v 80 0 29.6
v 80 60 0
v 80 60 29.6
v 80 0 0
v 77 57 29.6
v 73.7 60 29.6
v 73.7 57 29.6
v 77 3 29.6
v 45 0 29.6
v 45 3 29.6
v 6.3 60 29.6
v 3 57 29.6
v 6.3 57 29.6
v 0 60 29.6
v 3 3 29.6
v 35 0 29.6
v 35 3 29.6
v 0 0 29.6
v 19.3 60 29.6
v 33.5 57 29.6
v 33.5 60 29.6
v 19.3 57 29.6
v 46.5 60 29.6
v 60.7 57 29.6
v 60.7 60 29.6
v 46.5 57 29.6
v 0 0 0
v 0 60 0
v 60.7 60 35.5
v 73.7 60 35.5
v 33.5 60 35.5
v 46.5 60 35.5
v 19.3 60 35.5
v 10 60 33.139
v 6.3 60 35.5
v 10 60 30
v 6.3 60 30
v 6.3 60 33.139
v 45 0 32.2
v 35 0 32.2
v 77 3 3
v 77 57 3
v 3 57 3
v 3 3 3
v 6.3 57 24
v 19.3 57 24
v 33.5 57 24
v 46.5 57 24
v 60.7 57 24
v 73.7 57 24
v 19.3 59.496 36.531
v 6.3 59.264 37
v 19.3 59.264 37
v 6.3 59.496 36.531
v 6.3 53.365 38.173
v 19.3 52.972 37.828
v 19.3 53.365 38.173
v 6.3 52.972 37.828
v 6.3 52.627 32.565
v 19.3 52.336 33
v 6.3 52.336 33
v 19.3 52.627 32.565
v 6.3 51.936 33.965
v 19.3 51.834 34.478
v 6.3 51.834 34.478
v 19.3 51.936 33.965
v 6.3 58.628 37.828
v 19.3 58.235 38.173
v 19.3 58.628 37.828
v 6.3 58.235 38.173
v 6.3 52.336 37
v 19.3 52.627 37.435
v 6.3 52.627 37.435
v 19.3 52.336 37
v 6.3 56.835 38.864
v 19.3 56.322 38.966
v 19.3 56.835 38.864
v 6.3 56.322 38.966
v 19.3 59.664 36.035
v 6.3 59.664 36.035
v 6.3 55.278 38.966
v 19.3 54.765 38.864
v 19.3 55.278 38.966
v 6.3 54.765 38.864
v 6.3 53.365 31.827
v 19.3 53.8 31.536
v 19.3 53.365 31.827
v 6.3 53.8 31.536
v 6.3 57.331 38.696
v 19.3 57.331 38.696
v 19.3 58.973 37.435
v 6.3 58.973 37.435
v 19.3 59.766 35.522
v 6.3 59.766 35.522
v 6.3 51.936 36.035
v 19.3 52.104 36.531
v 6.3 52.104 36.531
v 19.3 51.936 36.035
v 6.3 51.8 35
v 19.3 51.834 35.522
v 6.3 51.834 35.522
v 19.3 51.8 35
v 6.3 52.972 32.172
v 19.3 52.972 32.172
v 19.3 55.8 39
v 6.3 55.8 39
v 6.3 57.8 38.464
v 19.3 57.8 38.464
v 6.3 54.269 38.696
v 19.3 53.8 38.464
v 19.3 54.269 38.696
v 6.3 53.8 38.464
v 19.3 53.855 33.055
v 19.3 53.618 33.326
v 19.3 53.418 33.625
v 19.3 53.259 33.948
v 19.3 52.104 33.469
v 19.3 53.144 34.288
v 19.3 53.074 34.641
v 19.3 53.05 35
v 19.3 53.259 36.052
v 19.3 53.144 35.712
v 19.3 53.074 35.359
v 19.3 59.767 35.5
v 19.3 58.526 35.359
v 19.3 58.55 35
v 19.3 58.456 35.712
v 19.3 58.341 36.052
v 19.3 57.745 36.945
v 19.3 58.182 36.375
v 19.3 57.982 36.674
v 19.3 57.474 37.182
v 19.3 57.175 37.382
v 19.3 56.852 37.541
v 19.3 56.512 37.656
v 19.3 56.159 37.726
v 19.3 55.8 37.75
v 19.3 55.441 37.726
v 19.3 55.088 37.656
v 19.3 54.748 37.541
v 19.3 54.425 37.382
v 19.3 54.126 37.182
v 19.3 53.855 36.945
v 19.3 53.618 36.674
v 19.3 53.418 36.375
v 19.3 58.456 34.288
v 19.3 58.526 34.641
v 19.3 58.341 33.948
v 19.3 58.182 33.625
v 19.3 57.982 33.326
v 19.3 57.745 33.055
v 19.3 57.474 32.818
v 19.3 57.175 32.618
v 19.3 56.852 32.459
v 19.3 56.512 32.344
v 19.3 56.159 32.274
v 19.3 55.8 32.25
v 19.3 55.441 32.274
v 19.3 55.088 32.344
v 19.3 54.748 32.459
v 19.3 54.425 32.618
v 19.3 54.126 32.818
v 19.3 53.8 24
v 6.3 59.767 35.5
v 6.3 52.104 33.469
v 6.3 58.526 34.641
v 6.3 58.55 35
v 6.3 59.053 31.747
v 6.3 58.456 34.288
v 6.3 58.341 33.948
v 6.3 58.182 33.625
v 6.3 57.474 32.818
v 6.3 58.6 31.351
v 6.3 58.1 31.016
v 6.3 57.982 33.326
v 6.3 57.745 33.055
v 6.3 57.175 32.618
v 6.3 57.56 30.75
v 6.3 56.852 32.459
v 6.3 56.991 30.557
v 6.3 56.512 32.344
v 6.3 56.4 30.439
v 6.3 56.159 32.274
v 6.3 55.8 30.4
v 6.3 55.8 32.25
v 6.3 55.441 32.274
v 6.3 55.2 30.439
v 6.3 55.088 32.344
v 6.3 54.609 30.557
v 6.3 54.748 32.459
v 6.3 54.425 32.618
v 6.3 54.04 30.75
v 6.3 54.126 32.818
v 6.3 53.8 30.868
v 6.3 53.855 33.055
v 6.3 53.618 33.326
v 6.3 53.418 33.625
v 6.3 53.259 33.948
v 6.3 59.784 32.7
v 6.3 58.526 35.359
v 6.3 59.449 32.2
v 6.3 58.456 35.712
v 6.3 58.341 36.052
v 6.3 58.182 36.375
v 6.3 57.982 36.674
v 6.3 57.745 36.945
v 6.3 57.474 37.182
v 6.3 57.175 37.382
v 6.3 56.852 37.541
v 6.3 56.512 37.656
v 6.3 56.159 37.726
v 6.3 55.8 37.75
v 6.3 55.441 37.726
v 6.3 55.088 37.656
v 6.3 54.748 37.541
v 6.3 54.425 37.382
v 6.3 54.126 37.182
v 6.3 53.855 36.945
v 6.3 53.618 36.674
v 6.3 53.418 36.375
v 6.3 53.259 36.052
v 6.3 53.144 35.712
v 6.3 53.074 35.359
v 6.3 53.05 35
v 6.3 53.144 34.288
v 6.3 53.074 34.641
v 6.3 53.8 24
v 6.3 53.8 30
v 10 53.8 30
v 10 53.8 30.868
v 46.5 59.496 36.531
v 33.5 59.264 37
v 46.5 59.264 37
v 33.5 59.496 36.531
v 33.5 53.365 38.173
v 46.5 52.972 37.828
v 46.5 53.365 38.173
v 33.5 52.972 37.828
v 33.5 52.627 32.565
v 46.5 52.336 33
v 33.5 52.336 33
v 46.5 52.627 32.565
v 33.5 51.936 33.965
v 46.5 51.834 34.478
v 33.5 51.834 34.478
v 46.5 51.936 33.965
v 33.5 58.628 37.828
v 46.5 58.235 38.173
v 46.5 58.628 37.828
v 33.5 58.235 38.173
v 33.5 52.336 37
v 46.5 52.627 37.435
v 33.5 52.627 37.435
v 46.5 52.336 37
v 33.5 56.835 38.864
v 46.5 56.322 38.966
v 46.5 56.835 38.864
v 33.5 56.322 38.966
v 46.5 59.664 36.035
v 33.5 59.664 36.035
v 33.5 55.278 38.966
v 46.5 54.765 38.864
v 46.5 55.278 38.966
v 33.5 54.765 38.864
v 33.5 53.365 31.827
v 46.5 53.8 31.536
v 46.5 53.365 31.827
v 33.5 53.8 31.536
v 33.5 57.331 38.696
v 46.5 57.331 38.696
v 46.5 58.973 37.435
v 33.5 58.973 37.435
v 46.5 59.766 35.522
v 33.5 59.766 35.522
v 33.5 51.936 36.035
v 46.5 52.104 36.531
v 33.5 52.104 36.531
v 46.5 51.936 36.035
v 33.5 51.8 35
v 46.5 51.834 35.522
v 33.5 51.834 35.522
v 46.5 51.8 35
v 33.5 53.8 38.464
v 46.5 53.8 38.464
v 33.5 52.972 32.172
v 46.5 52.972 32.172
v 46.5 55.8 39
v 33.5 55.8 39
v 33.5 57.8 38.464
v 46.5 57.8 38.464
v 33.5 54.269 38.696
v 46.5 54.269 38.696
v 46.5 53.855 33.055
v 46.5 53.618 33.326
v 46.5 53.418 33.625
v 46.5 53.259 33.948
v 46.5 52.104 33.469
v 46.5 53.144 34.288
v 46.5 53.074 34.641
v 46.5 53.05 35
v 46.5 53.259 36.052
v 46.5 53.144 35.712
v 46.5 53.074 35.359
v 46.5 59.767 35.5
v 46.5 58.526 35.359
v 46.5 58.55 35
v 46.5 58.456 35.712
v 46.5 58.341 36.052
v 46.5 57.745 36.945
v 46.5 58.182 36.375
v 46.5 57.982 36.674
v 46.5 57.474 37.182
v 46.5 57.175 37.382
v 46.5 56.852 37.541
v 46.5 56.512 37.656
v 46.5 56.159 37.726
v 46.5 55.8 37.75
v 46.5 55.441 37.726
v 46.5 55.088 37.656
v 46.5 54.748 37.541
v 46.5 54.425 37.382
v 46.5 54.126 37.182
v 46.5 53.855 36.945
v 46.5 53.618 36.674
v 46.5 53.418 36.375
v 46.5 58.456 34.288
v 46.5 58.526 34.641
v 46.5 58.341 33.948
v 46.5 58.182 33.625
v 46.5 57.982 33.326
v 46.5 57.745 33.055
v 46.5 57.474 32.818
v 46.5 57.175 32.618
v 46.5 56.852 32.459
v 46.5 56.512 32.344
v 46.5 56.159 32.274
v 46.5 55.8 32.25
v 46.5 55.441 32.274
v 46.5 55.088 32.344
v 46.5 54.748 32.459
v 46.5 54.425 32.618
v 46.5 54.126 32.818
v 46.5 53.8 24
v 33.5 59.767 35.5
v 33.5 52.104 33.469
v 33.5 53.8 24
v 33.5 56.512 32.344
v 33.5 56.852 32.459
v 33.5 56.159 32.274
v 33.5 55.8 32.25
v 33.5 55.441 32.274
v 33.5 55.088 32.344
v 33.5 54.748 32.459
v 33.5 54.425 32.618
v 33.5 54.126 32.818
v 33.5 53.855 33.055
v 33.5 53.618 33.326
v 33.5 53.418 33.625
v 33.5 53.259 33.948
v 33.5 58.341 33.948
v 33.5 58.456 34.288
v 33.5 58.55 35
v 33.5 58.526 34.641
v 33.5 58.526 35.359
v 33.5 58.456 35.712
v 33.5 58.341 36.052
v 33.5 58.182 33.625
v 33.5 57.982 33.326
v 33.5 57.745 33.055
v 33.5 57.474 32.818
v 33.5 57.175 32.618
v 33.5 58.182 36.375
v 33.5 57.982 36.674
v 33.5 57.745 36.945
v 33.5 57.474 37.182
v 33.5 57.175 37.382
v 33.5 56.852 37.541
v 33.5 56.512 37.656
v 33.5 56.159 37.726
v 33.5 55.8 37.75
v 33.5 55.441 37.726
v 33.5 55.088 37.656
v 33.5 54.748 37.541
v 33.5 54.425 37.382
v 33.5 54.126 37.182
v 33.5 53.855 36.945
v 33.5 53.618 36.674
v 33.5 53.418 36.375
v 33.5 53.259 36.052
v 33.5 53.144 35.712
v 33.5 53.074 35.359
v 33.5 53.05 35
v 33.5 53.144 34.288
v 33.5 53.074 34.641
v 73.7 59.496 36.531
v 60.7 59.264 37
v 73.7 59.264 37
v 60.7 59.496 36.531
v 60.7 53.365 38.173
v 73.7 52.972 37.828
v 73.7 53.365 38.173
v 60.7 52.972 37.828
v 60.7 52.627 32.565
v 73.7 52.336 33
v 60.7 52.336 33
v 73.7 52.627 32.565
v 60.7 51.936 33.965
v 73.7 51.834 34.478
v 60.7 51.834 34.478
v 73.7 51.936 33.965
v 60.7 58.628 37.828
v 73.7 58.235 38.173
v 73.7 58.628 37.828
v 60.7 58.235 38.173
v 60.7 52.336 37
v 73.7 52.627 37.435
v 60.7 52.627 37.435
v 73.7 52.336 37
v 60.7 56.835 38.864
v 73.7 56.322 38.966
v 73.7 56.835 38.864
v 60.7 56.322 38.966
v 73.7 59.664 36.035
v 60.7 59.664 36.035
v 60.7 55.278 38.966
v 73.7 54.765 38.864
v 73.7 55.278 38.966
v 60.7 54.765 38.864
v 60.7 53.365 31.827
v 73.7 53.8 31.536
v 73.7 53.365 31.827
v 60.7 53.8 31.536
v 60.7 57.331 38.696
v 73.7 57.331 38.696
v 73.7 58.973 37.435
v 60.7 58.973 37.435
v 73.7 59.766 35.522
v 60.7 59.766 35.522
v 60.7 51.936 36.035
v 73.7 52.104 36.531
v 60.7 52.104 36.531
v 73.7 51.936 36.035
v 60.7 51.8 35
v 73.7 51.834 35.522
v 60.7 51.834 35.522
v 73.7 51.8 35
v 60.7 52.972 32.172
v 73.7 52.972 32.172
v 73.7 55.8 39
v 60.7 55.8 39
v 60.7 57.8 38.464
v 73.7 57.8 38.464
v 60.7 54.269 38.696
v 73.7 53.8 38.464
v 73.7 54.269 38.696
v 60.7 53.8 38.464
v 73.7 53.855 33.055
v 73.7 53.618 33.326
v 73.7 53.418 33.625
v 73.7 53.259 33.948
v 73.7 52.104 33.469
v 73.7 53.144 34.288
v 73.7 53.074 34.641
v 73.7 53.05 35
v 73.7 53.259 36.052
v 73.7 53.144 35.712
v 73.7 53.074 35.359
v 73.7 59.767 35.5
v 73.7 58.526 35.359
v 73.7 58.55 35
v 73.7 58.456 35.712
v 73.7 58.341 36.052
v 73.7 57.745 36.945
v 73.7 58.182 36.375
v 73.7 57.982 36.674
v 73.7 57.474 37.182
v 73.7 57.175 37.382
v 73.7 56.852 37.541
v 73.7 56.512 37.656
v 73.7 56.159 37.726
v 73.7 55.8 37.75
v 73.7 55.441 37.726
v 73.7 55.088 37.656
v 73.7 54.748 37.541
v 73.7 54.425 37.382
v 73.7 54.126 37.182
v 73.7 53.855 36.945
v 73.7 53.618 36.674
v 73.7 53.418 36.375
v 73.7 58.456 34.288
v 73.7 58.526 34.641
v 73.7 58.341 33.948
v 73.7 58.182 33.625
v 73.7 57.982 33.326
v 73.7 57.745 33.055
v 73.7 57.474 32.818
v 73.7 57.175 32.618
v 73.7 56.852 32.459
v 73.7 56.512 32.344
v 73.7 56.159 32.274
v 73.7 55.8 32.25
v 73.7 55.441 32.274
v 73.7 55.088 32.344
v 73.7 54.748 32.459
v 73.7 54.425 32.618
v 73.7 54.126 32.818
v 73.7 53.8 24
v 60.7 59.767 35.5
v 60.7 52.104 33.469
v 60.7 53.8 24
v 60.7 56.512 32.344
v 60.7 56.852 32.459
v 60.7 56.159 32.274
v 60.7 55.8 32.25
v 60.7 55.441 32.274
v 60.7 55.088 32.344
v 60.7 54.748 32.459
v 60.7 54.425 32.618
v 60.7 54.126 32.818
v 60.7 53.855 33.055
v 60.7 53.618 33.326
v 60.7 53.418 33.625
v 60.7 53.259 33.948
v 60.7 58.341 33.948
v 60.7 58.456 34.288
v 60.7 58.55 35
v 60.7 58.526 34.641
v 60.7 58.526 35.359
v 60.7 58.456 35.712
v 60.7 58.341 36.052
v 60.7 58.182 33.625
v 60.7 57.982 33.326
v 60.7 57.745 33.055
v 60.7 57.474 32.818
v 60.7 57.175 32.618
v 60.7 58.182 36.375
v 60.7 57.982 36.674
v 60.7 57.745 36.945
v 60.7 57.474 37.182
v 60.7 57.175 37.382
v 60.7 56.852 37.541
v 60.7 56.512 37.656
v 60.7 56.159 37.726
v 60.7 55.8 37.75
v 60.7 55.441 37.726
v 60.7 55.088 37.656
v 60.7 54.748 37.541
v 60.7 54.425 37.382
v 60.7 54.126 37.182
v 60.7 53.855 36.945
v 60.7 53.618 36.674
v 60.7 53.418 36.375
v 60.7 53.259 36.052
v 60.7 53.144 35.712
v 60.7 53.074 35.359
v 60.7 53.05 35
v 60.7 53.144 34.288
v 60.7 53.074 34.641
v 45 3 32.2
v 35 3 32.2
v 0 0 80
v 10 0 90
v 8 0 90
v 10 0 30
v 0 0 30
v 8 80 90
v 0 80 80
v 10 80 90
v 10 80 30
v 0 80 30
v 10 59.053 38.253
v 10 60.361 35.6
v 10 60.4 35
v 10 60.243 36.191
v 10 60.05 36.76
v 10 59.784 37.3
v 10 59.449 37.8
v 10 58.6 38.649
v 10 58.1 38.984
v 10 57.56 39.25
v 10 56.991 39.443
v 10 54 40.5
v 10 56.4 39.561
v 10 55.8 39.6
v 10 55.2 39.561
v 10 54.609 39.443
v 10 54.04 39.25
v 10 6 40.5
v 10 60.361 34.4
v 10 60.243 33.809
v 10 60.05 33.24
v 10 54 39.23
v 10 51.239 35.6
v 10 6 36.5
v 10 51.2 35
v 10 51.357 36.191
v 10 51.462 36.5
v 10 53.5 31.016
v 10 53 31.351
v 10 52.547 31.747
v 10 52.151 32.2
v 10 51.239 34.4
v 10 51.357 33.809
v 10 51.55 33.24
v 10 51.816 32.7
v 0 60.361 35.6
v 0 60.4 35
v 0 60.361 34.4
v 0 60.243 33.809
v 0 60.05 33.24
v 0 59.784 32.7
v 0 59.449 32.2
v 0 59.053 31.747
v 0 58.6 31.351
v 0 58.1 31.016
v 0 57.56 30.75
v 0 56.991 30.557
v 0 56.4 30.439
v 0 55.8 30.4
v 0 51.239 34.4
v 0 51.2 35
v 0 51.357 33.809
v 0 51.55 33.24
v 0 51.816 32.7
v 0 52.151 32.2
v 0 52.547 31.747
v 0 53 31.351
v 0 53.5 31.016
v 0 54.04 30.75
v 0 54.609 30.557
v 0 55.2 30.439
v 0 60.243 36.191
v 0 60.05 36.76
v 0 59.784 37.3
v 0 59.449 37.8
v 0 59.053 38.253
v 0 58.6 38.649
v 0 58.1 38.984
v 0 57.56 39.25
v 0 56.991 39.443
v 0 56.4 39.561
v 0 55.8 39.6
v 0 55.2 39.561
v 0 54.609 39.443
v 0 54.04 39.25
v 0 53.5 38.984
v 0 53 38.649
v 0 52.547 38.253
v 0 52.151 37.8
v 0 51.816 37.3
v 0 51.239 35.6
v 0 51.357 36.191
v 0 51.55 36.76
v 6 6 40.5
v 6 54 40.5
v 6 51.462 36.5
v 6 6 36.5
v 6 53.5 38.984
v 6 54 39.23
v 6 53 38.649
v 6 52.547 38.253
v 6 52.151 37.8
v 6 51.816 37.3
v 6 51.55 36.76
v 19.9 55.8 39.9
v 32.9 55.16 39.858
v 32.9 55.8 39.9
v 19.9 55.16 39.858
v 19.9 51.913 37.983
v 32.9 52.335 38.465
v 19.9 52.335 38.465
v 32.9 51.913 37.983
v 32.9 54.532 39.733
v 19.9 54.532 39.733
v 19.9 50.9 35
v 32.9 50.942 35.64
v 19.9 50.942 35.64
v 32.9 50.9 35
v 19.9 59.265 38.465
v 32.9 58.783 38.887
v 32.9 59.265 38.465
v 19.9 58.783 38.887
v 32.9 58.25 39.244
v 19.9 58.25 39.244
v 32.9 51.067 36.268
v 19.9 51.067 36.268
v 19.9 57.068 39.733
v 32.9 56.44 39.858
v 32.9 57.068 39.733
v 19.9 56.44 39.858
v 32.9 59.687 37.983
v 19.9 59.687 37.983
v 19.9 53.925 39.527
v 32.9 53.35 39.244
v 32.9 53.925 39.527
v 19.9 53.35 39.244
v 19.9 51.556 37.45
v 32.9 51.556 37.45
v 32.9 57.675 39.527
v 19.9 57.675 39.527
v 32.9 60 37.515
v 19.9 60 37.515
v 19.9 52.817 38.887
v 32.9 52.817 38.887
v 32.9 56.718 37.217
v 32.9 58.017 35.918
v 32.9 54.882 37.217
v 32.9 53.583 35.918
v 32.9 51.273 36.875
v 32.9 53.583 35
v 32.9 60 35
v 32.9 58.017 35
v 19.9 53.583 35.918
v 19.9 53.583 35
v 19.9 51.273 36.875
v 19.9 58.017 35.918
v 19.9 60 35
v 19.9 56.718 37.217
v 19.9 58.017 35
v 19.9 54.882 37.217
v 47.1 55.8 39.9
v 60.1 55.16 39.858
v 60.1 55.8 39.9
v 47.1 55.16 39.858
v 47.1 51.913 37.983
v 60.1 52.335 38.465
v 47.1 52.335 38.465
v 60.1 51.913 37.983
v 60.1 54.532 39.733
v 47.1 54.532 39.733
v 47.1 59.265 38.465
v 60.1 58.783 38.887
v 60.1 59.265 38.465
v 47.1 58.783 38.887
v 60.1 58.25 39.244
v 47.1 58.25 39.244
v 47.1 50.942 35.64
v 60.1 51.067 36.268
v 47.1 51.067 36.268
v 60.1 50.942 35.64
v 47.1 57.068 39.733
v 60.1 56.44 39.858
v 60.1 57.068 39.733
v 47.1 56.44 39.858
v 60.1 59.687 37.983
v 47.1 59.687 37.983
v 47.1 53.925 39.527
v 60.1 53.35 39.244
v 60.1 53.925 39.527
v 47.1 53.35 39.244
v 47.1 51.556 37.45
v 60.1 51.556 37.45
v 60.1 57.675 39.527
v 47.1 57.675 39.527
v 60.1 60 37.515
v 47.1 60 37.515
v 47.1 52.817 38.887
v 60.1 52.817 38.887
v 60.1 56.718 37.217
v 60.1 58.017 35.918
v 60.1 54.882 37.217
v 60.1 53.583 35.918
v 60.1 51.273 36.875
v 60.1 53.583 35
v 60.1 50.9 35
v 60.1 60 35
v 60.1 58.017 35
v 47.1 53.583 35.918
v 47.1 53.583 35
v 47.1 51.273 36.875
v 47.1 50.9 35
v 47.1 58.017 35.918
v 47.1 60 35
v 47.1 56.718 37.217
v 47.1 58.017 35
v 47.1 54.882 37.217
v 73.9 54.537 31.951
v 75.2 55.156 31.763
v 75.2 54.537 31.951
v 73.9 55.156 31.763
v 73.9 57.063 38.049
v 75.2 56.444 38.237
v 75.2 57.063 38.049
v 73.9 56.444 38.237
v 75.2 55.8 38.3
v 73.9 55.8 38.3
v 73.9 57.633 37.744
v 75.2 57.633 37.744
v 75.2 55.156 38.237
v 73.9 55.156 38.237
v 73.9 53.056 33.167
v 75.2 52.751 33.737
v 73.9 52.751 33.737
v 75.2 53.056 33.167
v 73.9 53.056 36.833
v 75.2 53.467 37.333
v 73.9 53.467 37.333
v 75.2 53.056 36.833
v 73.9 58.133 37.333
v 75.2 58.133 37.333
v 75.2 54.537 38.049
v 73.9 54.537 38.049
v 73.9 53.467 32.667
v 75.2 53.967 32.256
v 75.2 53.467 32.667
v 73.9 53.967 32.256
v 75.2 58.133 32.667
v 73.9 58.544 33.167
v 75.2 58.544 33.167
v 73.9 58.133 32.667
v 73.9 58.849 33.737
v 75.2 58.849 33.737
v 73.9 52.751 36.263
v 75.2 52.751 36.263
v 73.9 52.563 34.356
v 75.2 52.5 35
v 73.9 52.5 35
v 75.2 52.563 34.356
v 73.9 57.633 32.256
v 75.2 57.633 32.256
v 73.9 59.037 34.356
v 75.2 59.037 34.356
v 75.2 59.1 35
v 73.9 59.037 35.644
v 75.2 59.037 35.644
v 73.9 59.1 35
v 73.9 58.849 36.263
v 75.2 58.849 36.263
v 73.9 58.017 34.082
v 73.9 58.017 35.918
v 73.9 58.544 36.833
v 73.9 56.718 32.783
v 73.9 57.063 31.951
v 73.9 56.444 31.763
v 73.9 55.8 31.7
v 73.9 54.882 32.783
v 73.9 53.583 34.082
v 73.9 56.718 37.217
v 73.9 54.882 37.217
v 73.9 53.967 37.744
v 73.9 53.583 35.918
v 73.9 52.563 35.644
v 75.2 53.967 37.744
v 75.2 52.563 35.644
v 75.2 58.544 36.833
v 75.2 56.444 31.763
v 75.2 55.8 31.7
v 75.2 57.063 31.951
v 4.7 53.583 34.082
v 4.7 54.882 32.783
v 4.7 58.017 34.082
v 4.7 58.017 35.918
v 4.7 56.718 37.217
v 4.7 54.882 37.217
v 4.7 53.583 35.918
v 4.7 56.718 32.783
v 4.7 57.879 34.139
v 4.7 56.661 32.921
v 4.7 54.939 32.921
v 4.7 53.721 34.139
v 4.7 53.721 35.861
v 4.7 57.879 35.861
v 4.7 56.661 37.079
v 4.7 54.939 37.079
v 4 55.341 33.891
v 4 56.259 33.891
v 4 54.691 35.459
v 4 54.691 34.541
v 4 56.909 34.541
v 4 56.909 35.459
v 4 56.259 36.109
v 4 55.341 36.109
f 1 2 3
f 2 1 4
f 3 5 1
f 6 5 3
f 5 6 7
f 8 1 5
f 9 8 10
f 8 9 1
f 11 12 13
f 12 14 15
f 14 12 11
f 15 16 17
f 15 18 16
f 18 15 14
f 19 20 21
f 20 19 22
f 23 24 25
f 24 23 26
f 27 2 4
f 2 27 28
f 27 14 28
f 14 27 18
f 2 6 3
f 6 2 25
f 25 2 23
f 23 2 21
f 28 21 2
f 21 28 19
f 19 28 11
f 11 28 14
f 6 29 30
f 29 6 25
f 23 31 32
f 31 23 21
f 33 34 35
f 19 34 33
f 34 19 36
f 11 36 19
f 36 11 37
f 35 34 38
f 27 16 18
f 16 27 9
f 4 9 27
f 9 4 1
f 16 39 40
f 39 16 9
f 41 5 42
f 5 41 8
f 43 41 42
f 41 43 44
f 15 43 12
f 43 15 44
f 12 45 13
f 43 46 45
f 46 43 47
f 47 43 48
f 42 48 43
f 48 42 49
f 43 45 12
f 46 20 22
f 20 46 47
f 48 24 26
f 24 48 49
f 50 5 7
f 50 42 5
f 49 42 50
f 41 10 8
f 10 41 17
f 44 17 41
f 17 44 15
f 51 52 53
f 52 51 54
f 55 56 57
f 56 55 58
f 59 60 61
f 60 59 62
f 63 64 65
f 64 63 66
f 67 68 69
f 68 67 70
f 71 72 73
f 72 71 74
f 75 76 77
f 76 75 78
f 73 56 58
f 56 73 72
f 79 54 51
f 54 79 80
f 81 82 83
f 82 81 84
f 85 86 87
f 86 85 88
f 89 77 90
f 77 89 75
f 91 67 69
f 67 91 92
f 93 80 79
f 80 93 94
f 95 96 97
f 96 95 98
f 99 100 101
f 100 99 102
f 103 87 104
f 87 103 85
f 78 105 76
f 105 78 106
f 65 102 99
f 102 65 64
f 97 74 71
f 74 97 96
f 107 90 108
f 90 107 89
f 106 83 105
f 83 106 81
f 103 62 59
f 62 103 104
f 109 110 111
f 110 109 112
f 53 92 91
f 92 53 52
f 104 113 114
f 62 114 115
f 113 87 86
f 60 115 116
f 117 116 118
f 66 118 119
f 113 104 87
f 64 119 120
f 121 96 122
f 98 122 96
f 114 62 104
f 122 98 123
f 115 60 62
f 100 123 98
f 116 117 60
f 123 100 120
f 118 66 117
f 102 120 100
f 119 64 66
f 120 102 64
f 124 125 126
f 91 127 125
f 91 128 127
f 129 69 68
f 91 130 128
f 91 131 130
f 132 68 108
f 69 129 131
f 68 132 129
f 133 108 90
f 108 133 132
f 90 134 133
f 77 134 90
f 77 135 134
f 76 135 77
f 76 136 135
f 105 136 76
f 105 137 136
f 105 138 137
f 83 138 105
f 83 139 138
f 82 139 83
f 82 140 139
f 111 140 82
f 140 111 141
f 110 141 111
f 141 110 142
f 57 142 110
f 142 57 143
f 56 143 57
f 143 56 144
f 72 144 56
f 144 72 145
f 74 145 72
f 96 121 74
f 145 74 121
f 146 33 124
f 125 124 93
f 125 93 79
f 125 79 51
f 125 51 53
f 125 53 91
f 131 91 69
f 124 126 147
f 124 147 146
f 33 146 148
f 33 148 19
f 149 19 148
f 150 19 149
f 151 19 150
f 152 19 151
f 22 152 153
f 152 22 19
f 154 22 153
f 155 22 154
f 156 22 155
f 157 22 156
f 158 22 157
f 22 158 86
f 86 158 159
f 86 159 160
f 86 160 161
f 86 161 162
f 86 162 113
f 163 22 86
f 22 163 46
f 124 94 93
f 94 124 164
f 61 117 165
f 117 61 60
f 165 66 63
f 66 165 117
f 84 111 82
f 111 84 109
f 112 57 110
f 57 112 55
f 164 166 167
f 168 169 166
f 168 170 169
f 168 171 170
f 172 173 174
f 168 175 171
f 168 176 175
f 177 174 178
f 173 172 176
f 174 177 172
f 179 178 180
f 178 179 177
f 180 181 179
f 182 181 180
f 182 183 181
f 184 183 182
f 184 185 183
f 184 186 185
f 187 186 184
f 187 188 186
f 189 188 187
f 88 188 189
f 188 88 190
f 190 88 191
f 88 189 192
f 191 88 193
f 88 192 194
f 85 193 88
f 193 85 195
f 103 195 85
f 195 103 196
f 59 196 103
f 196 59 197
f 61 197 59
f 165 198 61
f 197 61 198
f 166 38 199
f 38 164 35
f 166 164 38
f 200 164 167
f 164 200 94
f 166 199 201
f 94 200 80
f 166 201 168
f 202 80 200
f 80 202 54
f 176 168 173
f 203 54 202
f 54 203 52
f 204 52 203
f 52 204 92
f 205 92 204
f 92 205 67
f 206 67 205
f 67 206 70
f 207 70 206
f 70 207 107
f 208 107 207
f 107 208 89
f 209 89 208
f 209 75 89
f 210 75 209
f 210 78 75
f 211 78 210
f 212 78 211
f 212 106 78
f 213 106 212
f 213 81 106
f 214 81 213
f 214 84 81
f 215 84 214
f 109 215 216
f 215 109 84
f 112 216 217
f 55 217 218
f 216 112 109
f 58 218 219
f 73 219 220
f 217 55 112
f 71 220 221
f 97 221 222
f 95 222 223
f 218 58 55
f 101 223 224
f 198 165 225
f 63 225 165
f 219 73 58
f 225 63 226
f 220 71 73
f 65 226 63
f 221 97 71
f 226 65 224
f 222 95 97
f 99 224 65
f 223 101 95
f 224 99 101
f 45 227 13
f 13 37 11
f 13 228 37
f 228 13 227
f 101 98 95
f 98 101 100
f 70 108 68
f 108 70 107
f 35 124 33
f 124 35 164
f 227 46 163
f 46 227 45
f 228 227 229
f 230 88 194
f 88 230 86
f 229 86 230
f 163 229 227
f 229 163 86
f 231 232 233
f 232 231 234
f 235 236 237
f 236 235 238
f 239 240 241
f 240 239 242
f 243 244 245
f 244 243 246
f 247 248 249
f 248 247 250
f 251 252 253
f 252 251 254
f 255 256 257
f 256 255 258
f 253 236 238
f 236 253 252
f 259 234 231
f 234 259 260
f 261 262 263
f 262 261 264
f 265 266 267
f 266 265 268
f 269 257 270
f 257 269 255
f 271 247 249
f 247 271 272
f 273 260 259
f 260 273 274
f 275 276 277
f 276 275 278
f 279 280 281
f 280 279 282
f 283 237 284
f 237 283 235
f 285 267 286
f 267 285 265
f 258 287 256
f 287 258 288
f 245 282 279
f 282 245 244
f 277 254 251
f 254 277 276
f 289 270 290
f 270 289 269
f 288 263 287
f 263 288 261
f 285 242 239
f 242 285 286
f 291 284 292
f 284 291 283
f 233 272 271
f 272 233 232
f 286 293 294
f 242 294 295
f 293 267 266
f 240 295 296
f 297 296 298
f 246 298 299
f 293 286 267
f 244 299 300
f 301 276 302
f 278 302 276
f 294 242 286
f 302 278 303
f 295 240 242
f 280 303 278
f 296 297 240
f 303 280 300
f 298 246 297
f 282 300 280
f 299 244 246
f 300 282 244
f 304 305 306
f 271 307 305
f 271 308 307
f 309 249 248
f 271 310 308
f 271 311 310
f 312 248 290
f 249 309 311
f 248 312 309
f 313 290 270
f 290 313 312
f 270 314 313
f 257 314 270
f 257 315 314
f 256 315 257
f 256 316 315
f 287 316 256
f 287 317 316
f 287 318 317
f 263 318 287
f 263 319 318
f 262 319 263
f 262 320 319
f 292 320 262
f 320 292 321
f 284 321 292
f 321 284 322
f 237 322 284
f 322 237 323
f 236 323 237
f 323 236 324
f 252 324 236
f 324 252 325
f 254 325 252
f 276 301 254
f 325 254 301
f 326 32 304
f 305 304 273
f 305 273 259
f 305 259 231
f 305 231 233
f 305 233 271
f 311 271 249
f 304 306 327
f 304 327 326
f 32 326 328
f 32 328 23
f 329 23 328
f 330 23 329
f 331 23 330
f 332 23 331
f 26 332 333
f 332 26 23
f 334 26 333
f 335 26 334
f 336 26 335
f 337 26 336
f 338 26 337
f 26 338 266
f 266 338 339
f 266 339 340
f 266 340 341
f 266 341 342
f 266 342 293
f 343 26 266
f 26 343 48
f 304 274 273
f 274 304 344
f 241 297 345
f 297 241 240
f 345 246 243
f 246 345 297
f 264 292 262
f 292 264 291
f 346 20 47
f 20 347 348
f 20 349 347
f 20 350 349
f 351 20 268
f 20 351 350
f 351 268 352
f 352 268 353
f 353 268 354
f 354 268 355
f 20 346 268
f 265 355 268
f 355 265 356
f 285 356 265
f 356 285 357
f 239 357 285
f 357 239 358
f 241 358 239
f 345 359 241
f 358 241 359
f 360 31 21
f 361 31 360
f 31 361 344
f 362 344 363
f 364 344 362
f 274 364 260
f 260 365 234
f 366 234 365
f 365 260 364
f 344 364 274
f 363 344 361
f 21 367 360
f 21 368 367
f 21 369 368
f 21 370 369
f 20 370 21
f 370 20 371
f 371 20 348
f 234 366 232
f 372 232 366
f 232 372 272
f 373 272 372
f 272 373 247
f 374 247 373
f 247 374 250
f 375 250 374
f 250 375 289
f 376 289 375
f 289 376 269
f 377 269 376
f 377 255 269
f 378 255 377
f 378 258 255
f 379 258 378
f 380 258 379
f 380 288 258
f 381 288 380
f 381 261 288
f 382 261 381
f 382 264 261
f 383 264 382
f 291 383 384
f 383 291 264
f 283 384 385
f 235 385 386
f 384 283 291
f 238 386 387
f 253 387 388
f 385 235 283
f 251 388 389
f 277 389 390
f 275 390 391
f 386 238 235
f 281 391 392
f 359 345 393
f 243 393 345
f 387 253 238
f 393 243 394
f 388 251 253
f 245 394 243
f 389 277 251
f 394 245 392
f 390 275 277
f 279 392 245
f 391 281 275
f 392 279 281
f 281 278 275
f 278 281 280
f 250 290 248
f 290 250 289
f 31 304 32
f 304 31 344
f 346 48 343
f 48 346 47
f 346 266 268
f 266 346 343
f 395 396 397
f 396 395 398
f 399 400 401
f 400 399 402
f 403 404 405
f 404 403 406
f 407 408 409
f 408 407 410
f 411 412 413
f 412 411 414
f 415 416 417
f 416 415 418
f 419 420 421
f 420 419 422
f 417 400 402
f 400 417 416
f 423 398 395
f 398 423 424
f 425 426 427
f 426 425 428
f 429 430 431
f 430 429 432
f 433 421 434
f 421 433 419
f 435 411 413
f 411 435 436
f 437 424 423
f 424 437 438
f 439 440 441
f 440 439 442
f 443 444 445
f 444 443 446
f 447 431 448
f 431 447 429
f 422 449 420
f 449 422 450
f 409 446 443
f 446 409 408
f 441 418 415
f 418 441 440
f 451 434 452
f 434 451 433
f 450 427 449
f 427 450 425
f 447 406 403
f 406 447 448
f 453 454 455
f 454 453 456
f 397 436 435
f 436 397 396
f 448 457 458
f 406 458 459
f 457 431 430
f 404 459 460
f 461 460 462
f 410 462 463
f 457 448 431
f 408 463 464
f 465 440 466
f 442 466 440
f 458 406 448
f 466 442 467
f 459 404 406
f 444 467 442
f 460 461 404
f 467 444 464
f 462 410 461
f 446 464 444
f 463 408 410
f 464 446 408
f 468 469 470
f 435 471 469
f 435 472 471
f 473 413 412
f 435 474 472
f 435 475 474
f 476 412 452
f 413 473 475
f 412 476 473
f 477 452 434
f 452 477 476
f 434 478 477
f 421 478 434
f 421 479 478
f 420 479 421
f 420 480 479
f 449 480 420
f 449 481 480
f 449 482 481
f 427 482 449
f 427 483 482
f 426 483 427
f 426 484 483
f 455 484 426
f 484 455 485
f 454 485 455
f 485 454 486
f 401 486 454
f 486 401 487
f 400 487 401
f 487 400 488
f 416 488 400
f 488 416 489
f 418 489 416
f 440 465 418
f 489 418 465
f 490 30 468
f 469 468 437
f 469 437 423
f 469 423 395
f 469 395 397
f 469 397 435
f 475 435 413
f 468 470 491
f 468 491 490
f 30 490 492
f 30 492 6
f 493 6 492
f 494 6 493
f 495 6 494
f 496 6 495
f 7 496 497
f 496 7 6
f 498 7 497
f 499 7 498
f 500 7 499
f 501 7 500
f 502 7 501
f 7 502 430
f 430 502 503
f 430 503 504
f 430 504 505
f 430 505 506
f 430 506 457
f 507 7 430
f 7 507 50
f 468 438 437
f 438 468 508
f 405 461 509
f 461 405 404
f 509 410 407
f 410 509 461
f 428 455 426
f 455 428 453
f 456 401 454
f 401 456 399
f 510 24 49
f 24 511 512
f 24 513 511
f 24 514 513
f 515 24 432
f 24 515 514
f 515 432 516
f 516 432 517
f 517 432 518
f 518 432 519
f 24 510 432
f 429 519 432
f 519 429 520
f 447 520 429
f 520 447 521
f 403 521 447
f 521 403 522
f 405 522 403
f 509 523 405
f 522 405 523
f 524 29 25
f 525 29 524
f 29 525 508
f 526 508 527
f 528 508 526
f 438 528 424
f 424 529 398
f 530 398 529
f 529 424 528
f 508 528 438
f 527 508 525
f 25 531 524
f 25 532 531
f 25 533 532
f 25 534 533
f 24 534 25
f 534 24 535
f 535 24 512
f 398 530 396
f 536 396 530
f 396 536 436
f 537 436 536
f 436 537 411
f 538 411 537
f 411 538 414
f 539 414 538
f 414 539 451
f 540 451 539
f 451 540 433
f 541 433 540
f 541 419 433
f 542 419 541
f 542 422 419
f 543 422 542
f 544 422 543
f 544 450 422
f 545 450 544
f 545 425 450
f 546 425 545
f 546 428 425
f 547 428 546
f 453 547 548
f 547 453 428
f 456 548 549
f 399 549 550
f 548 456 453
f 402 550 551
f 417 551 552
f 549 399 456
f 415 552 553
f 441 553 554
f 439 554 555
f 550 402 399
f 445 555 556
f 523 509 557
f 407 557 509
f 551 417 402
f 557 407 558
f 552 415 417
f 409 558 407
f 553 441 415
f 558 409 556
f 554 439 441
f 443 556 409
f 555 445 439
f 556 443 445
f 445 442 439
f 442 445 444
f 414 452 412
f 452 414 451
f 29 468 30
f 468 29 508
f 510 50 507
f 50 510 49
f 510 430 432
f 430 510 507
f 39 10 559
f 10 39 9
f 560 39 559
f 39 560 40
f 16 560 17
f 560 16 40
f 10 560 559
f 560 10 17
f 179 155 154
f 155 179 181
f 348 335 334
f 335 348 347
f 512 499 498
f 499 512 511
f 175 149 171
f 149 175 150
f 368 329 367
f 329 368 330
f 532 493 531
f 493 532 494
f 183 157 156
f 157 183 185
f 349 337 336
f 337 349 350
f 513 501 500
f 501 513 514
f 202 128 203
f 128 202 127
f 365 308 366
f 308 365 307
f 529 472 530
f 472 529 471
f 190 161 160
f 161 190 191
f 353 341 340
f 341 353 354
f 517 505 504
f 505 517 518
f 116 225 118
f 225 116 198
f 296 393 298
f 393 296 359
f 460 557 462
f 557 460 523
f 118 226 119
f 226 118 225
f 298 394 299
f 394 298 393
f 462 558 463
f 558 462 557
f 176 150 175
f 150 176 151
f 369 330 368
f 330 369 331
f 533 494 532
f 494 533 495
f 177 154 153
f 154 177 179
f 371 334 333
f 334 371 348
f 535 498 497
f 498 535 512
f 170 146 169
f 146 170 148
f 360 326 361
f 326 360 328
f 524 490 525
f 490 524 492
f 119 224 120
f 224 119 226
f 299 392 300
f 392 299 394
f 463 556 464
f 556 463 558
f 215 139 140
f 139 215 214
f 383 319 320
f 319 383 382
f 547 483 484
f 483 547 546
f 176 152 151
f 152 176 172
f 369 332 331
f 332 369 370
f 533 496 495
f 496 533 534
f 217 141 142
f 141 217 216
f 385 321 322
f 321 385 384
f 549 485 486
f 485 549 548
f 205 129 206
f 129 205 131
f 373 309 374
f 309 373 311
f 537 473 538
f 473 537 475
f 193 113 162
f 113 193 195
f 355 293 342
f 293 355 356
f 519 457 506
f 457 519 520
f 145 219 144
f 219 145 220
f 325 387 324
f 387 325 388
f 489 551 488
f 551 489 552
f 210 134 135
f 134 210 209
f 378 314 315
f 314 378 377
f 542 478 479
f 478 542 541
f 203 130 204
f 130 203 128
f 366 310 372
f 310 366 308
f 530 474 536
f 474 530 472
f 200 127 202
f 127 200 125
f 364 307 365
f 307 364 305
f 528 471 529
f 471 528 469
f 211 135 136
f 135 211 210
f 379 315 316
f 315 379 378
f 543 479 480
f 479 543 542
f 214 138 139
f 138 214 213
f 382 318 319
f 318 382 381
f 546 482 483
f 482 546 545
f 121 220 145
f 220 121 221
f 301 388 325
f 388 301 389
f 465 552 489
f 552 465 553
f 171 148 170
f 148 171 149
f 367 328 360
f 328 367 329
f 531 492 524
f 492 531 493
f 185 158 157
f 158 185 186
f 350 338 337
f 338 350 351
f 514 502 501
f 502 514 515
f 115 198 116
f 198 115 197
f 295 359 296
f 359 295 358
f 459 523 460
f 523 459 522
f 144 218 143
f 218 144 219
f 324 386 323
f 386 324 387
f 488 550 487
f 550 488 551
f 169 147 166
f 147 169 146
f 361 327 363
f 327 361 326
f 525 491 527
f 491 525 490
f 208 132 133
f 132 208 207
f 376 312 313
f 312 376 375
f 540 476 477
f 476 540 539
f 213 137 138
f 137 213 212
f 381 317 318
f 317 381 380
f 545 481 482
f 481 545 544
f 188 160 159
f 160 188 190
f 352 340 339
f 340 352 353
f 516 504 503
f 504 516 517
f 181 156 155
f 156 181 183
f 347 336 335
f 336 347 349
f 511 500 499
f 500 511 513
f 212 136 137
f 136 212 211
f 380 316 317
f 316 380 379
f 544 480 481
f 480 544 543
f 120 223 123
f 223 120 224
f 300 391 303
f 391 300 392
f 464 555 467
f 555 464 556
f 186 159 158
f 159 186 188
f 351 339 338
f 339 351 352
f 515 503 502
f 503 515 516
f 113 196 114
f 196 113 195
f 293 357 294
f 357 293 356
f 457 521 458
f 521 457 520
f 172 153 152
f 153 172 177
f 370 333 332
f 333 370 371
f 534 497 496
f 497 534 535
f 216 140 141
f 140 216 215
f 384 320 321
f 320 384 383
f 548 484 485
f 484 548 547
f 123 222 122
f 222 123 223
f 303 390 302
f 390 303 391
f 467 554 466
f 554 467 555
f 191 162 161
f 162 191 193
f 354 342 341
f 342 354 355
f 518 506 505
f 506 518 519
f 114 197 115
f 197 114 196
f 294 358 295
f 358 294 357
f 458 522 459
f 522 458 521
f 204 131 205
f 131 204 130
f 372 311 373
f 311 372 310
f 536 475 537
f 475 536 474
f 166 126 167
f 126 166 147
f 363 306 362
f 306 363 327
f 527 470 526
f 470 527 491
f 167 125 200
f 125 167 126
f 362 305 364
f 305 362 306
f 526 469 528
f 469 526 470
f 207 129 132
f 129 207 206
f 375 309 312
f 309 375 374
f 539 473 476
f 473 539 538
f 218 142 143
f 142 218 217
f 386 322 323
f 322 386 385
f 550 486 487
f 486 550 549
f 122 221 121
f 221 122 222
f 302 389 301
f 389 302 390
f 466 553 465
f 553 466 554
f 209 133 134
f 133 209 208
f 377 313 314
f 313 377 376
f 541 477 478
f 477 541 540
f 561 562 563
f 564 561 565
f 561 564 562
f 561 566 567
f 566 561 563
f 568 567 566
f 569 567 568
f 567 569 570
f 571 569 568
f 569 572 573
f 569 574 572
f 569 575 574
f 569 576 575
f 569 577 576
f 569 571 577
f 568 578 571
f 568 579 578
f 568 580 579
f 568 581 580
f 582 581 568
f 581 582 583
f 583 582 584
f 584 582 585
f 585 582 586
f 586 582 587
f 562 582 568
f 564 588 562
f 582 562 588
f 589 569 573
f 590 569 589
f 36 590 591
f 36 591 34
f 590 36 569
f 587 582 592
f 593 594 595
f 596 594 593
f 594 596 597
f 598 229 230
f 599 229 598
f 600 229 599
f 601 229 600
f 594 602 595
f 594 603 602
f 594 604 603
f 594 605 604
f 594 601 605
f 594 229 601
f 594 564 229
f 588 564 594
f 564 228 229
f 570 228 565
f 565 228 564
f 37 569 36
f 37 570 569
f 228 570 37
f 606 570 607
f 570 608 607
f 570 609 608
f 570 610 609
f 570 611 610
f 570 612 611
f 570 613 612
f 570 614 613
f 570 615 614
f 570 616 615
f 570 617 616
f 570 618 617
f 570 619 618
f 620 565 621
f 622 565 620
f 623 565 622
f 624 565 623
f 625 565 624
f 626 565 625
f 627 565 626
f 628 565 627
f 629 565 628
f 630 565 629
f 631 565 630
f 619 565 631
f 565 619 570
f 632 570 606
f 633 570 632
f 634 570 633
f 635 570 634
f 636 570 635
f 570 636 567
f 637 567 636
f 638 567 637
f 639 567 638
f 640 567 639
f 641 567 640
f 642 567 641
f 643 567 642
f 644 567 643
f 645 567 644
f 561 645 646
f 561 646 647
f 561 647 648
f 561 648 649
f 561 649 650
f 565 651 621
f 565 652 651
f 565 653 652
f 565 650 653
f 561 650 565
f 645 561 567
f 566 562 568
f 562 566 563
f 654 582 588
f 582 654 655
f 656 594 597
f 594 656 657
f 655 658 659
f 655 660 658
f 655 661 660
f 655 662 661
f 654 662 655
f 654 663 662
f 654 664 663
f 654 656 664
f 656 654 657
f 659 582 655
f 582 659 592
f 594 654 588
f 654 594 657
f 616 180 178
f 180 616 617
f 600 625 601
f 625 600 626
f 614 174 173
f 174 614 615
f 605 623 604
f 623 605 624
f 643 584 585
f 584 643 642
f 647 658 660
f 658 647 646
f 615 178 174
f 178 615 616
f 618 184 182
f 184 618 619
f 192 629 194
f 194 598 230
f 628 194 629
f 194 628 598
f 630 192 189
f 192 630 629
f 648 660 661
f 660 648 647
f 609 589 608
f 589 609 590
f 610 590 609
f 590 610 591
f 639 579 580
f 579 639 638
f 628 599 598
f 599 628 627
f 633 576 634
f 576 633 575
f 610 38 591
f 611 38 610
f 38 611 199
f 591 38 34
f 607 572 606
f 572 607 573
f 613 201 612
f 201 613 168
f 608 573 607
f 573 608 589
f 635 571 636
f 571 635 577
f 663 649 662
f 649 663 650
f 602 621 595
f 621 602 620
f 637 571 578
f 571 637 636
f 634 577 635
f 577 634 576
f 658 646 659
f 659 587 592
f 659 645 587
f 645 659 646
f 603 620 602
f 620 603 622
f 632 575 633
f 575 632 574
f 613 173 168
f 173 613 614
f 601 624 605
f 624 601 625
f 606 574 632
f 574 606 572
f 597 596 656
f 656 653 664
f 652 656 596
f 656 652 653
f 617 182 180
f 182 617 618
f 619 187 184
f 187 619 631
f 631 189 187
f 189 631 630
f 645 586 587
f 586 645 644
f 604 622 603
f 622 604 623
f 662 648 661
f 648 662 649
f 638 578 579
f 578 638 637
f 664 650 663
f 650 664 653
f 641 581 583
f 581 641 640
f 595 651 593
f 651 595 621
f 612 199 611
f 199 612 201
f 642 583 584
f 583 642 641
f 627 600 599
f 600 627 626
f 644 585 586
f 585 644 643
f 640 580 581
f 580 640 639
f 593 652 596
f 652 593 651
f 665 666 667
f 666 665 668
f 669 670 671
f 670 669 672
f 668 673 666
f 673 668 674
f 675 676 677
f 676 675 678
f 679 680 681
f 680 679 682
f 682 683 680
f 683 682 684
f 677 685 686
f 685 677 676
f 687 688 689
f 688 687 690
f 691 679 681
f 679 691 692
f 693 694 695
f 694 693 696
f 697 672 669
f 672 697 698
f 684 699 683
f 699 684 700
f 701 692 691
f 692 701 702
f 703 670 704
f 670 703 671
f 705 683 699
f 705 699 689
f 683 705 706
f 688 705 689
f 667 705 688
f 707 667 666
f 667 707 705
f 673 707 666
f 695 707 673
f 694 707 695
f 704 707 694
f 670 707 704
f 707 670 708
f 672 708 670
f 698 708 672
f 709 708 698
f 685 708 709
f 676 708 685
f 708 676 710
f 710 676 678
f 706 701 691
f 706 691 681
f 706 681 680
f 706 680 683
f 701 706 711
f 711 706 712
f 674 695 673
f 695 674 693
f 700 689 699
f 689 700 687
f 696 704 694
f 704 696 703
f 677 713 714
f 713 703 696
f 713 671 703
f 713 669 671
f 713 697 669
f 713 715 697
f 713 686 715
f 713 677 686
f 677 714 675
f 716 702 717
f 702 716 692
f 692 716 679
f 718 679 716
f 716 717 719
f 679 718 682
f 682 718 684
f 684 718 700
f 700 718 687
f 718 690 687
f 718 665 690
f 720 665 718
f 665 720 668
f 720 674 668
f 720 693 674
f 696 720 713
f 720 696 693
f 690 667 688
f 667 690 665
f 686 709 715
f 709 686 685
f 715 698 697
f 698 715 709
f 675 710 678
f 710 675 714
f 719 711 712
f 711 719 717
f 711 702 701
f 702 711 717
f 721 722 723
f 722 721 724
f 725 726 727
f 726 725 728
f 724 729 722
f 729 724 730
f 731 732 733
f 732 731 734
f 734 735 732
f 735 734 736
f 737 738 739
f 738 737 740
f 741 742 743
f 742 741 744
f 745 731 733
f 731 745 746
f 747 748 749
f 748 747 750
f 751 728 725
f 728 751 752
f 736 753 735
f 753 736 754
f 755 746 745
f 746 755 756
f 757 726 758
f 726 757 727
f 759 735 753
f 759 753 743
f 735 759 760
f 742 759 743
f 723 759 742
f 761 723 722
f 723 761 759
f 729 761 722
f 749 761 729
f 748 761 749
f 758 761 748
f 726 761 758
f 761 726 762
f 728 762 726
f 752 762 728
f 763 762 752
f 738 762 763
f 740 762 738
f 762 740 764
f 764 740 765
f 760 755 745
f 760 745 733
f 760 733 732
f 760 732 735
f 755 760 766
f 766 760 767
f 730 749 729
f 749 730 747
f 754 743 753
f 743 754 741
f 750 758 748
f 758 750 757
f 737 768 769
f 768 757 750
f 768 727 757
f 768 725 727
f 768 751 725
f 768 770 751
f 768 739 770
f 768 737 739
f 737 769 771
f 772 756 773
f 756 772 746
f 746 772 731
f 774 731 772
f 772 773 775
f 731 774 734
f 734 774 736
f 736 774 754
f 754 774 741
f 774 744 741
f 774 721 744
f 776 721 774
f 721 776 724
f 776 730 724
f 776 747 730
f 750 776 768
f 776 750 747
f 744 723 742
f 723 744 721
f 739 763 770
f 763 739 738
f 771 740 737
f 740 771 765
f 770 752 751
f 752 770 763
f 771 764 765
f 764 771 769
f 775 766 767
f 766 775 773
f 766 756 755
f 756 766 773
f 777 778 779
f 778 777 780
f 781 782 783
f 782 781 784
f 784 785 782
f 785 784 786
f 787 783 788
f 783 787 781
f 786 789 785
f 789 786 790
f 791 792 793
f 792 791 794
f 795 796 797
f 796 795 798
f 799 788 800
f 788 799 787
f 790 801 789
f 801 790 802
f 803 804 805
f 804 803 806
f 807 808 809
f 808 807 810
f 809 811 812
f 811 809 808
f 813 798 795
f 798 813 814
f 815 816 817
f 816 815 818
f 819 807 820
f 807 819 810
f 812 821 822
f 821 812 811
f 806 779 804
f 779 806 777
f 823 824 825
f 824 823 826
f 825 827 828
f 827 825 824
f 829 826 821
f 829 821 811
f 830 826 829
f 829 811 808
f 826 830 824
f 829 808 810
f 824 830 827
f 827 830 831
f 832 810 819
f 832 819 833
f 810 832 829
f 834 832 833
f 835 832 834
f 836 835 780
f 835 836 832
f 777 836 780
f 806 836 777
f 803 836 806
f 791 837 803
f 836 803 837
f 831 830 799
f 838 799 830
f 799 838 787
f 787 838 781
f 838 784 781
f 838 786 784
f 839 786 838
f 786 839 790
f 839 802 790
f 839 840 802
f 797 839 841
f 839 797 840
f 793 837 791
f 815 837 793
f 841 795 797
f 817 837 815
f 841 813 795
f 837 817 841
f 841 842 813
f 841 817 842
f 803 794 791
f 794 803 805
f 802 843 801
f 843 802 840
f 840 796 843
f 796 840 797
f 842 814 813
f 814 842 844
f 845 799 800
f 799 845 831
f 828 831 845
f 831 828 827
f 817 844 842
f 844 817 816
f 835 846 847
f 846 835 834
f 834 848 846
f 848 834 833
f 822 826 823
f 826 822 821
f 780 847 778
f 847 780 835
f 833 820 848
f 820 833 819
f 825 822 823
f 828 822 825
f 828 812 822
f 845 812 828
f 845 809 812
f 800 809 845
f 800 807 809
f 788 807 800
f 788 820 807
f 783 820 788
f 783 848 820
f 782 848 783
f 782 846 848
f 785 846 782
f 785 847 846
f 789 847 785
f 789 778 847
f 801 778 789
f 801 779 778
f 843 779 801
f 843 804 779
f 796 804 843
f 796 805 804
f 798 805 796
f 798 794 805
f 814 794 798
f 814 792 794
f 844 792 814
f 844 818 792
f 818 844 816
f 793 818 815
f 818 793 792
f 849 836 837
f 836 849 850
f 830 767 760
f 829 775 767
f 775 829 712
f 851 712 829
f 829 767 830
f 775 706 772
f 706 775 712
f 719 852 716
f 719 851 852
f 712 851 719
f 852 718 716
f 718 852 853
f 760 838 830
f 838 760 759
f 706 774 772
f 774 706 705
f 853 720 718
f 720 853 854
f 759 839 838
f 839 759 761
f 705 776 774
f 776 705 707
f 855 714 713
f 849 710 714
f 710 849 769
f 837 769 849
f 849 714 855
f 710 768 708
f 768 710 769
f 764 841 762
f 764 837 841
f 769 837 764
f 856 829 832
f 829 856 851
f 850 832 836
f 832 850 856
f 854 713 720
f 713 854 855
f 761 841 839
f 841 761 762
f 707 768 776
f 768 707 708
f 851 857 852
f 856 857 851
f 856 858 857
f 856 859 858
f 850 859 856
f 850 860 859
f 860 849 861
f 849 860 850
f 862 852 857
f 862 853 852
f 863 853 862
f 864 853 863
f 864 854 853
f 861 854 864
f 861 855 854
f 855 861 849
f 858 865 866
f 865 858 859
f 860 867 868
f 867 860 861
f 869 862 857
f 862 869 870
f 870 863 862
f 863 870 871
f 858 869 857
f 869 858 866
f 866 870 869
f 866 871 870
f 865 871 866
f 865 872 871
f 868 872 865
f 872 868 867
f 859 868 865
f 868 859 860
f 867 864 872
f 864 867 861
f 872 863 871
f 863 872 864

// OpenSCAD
// Print-in-place hinged box, 80 x 60 x 40 mm closed.
// Printed closed in PLA (Bambu A1, 0.4 nozzle): base, lid and a captive
// hinge pin are separate bodies with 0.35-0.6 mm clearances, so the hinge
// breaks free by hand.  No supports: the lid underside bridges the cavity,
// the hinge barrels/pin use faceted (octagonal) lower surfaces, and all
// other downward faces are short bridges or rest on the body below.

/* [Part] */
part = "assembly"; // [assembly, box, lid, pin]

/* [Dimensions] */
box_w = 80;          // X, outside
box_d = 60;          // Y, outside (front y=0, back y=60)
box_h = 29.6;        // base height to its rim
lid_h = 10;          // lid height; lid bottom at z=30 (0.4 gap)
lid_z = 30;
wall = 3;
floor_t = 3;
total_h = 40;

hinge_y = 55.8;      // hinge axis, assembly coords
hinge_z = 35;
barrel_r = 4.0;
pin_r = 2.4;         // octagon circumradius
bore_r = 2.75;       // pin_r + 0.35 radial clearance
relief_r = 4.6;      // barrel_r + 0.6

// Alternating knuckles along the back edge (x intervals), 0.6 mm end gaps.
box_segs  = [[6.3, 19.3], [33.5, 46.5], [60.7, 73.7]];
lid_segs  = [[19.9, 32.9], [47.1, 60.1]];

cadverify_only = "";
module instance(name, part_name, unit = 1) {
    echo(cadverify_instance = [name, part_name, unit]);
    if (cadverify_only == "" || cadverify_only == name) children();
}

// ---------------------------------------------------------------- base (box)
module box_main() {
    difference() {
        union() {
            // shell: outer block minus open-top cavity
            difference() {
                cube([box_w, box_d, box_h]);
                translate([wall, wall, floor_t]) cube([box_w - 2 * wall, box_d - 2 * wall, box_h]);
            }
            // hinge knuckles (base) + support posts down to the back wall
            for (s = box_segs) {
                translate([s[0], hinge_y, hinge_z]) rotate([0, 90, 0])
                    cylinder(h = s[1] - s[0], r = barrel_r, $fn = 48);
                translate([s[0], 53.8, 24]) cube([s[1] - s[0], 6.2, 11.5]);
            }
            // front catch tooth (enters the socket in the lid)
            translate([35, 0, box_h]) cube([10, wall, 2.6]);
        }
        // pin bore through the base knuckles
        translate([-1, hinge_y, hinge_z]) rotate([0, 90, 0])
            cylinder(h = box_w + 2, r = bore_r, $fn = 48);
    }
}

// ---------------------------------------------------------------- lid (local: z 0..10, hinge axis at z=5)
module lid_main() {
    union() {
        difference() {
            union() {
                // main slab, side profile (Y-Z) extruded along X.
                // Rear lower edge chamfered 50,0 -> 60,8 so the slab
                // swings clear of the base back wall.
                multmatrix([[0, 1, 0, 0], [0, 0, 1, 0], [1, 0, 0, 0], [0, 0, 0, 1]])
                    linear_extrude(height = box_w)
                        polygon(points = [[0, 0], [50, 0], [60, 8], [60, 10], [0, 10]]);
                // hinge knuckles (lid)
                for (s = lid_segs)
                    translate([s[0], hinge_y, 5]) rotate([0, 90, 0])
                        cylinder(h = s[1] - s[0], r = barrel_r, $fn = 48);
            }
            // recessed panel in the top face
            translate([6, 6, 6.5]) cube([68, 48, 4]);
            // front catch socket (tooth: x35..45, z assy 29.6..32.2)
            translate([34.4, -1, -0.5]) cube([11.2, 4.6, 3.2]);
            // clearance tunnel for the base knuckles / pin
            translate([-1, hinge_y, 5]) rotate([0, 90, 0])
                cylinder(h = box_w + 2, r = relief_r, $fn = 48);
            // pin bore through the lid knuckles
            translate([-1, hinge_y, 5]) rotate([0, 90, 0])
                cylinder(h = box_w + 2, r = bore_r, $fn = 48);
        }
        // webs joining lid knuckles to the slab: upper half-discs r=4.9
        // (stay above z=30.1 in assembly, clear of the base rim at 29.6)
        for (s = lid_segs)
            intersection() {
                translate([s[0], hinge_y, 5]) rotate([0, 90, 0])
                    cylinder(h = s[1] - s[0], r = 4.9, $fn = 48);
                translate([s[0], hinge_y - 10, 5]) cube([s[1] - s[0], 20, 5]);
                translate([s[0], 0, 0]) cube([s[1] - s[0], box_d, lid_h]);
            }
    }
}

// ---------------------------------------------------------------- pin
// Centred on its axis, local +Z from head (z=0) to tip (z=71.2).
module pin_geom() {
    union() {
        cylinder(h = 1.3, r = 3.3, $fn = 32);                    // head
        translate([0, 0, 1.0]) rotate([0, 0, 22.5])
            cylinder(h = 69.5, r = pin_r, $fn = 8);              // octagonal shaft
        translate([0, 0, 70.4]) rotate([0, 0, 22.5])
            cylinder(h = 0.8, r1 = pin_r, r2 = 1.2, $fn = 8);    // lead-in tip
    }
}
module pin_part() { translate([3.3, 3.3, 0]) pin_geom(); }

// ---------------------------------------------------------------- output
if (part == "box") {
    echo(cadverify_spec = [
        ["bounds", [[0, 0, 0], [box_w, box_d, hinge_z + barrel_r]]],
        ["bodies", 1],
        ["copies", 1],
        ["support_faces", [["bed", "-z", 4000]]],
        ["overhangs_allowed", [["hinge knuckles and pin bore print in place; faceted bore ceiling is a short internal bridge", [[5, 51, 30], [75, 60, 39.5]]]]],
        ["details", [
            ["cavity", "void", [[4, 4, 10], [76, 53, 29]], 0.95],
            ["front_wall", "thickness", [40, -1, 15], [0, 1, 0], 3],
            ["floor", "thickness", [40, 30, -1], [0, 0, 1], 3],
            ["box_knuckle", "material", [[7, 56.5, 37.5], [18, 59.5, 38.8]], 0.9],
            ["pin_bore", "void", [[8, 54.9, 34.1], [17, 56.7, 35.9]], 0.9],
            ["catch_tooth", "material", [[36, 0.5, 30], [44, 2.5, 32]], 0.85],
            ["hinge_knuckles", "view", [[4, 50, 28], [76, 60, 39.5]]]
        ]]
    ]);
    box_main();
} else if (part == "lid") {
    echo(cadverify_spec = [
        ["bounds", [[0, 0, 0], [box_w, box_d, lid_h]]],
        ["bodies", 1],
        ["copies", 1],
        ["support_faces", [["print_face", "-z", 3000]]],
        ["overhangs_allowed", [["lid knuckle bores print in place around the pin; bore ceilings are short internal bridges", [[5, 51, 0], [75, 60, 10]]]]],
        ["details", [
            ["top_pocket", "void", [[7, 7, 6.6], [73, 53, 9.9]], 0.95],
            ["lid_slab", "thickness", [40, 30, 9], [0, 0, -1], 6.5],
            ["lid_knuckle", "material", [[21, 57, 7], [32, 59.5, 8.6]], 0.9],
            ["pin_bore", "void", [[22, 54.9, 4.1], [31, 56.7, 5.9]], 0.9],
            ["catch_socket", "void", [[35, 0.5, 0.2], [45, 2.5, 2.5]], 0.9],
            ["hinge_knuckles", "view", [[4, 50, 0], [76, 60, 10]]]
        ]]
    ]);
    lid_main();
} else if (part == "pin") {
    echo(cadverify_spec = [
        ["bounds", [[0, 0, 0], [6.6, 6.6, 71.2]]],
        ["bodies", 1],
        ["copies", 1],
        ["support_faces", [["head_base", "-z", 30]]],
        ["overhangs_allowed", []],
        ["details", [
            ["pin_shaft", "material", [[2, 2, 10], [4.6, 4.6, 20]], 0.9],
            ["pin_head", "material", [[1, 1, 0.1], [5.6, 5.6, 1.2]], 0.75],
            ["pin_length", "thickness", [1.2, 3.3, 72], [0, 0, -1], 71.2],
            ["pin_head_view", "view", [[0, 0, 0], [6.6, 6.6, 2]]]
        ]]
    ]);
    pin_part();
} else if (part == "assembly") {
    echo(cadverify_spec = [
        ["bounds", [[0, 0, 0], [box_w, box_d, total_h]]],
        ["support_faces", [["bed", "-z", 4000]]],
        ["allowed_interferences", []],
        ["motions", [
            ["lid_swing", ["lid"], "rotate", [0, hinge_y, hinge_z], [-1, 0, 0], [0, 110]]
        ]],
        ["assembly_order", [
            [["base"], [0, 0, 0]],
            [["lid"], [0, 0, -1]],
            [["pin"], [-1, 0, 0]]
        ]]
    ]);
    instance("base", "box") box_main();
    instance("lid", "lid") translate([0, 0, lid_z]) lid_main();
    instance("pin", "pin") translate([75.2, hinge_y, hinge_z]) rotate([0, -90, 0]) pin_geom();
}
